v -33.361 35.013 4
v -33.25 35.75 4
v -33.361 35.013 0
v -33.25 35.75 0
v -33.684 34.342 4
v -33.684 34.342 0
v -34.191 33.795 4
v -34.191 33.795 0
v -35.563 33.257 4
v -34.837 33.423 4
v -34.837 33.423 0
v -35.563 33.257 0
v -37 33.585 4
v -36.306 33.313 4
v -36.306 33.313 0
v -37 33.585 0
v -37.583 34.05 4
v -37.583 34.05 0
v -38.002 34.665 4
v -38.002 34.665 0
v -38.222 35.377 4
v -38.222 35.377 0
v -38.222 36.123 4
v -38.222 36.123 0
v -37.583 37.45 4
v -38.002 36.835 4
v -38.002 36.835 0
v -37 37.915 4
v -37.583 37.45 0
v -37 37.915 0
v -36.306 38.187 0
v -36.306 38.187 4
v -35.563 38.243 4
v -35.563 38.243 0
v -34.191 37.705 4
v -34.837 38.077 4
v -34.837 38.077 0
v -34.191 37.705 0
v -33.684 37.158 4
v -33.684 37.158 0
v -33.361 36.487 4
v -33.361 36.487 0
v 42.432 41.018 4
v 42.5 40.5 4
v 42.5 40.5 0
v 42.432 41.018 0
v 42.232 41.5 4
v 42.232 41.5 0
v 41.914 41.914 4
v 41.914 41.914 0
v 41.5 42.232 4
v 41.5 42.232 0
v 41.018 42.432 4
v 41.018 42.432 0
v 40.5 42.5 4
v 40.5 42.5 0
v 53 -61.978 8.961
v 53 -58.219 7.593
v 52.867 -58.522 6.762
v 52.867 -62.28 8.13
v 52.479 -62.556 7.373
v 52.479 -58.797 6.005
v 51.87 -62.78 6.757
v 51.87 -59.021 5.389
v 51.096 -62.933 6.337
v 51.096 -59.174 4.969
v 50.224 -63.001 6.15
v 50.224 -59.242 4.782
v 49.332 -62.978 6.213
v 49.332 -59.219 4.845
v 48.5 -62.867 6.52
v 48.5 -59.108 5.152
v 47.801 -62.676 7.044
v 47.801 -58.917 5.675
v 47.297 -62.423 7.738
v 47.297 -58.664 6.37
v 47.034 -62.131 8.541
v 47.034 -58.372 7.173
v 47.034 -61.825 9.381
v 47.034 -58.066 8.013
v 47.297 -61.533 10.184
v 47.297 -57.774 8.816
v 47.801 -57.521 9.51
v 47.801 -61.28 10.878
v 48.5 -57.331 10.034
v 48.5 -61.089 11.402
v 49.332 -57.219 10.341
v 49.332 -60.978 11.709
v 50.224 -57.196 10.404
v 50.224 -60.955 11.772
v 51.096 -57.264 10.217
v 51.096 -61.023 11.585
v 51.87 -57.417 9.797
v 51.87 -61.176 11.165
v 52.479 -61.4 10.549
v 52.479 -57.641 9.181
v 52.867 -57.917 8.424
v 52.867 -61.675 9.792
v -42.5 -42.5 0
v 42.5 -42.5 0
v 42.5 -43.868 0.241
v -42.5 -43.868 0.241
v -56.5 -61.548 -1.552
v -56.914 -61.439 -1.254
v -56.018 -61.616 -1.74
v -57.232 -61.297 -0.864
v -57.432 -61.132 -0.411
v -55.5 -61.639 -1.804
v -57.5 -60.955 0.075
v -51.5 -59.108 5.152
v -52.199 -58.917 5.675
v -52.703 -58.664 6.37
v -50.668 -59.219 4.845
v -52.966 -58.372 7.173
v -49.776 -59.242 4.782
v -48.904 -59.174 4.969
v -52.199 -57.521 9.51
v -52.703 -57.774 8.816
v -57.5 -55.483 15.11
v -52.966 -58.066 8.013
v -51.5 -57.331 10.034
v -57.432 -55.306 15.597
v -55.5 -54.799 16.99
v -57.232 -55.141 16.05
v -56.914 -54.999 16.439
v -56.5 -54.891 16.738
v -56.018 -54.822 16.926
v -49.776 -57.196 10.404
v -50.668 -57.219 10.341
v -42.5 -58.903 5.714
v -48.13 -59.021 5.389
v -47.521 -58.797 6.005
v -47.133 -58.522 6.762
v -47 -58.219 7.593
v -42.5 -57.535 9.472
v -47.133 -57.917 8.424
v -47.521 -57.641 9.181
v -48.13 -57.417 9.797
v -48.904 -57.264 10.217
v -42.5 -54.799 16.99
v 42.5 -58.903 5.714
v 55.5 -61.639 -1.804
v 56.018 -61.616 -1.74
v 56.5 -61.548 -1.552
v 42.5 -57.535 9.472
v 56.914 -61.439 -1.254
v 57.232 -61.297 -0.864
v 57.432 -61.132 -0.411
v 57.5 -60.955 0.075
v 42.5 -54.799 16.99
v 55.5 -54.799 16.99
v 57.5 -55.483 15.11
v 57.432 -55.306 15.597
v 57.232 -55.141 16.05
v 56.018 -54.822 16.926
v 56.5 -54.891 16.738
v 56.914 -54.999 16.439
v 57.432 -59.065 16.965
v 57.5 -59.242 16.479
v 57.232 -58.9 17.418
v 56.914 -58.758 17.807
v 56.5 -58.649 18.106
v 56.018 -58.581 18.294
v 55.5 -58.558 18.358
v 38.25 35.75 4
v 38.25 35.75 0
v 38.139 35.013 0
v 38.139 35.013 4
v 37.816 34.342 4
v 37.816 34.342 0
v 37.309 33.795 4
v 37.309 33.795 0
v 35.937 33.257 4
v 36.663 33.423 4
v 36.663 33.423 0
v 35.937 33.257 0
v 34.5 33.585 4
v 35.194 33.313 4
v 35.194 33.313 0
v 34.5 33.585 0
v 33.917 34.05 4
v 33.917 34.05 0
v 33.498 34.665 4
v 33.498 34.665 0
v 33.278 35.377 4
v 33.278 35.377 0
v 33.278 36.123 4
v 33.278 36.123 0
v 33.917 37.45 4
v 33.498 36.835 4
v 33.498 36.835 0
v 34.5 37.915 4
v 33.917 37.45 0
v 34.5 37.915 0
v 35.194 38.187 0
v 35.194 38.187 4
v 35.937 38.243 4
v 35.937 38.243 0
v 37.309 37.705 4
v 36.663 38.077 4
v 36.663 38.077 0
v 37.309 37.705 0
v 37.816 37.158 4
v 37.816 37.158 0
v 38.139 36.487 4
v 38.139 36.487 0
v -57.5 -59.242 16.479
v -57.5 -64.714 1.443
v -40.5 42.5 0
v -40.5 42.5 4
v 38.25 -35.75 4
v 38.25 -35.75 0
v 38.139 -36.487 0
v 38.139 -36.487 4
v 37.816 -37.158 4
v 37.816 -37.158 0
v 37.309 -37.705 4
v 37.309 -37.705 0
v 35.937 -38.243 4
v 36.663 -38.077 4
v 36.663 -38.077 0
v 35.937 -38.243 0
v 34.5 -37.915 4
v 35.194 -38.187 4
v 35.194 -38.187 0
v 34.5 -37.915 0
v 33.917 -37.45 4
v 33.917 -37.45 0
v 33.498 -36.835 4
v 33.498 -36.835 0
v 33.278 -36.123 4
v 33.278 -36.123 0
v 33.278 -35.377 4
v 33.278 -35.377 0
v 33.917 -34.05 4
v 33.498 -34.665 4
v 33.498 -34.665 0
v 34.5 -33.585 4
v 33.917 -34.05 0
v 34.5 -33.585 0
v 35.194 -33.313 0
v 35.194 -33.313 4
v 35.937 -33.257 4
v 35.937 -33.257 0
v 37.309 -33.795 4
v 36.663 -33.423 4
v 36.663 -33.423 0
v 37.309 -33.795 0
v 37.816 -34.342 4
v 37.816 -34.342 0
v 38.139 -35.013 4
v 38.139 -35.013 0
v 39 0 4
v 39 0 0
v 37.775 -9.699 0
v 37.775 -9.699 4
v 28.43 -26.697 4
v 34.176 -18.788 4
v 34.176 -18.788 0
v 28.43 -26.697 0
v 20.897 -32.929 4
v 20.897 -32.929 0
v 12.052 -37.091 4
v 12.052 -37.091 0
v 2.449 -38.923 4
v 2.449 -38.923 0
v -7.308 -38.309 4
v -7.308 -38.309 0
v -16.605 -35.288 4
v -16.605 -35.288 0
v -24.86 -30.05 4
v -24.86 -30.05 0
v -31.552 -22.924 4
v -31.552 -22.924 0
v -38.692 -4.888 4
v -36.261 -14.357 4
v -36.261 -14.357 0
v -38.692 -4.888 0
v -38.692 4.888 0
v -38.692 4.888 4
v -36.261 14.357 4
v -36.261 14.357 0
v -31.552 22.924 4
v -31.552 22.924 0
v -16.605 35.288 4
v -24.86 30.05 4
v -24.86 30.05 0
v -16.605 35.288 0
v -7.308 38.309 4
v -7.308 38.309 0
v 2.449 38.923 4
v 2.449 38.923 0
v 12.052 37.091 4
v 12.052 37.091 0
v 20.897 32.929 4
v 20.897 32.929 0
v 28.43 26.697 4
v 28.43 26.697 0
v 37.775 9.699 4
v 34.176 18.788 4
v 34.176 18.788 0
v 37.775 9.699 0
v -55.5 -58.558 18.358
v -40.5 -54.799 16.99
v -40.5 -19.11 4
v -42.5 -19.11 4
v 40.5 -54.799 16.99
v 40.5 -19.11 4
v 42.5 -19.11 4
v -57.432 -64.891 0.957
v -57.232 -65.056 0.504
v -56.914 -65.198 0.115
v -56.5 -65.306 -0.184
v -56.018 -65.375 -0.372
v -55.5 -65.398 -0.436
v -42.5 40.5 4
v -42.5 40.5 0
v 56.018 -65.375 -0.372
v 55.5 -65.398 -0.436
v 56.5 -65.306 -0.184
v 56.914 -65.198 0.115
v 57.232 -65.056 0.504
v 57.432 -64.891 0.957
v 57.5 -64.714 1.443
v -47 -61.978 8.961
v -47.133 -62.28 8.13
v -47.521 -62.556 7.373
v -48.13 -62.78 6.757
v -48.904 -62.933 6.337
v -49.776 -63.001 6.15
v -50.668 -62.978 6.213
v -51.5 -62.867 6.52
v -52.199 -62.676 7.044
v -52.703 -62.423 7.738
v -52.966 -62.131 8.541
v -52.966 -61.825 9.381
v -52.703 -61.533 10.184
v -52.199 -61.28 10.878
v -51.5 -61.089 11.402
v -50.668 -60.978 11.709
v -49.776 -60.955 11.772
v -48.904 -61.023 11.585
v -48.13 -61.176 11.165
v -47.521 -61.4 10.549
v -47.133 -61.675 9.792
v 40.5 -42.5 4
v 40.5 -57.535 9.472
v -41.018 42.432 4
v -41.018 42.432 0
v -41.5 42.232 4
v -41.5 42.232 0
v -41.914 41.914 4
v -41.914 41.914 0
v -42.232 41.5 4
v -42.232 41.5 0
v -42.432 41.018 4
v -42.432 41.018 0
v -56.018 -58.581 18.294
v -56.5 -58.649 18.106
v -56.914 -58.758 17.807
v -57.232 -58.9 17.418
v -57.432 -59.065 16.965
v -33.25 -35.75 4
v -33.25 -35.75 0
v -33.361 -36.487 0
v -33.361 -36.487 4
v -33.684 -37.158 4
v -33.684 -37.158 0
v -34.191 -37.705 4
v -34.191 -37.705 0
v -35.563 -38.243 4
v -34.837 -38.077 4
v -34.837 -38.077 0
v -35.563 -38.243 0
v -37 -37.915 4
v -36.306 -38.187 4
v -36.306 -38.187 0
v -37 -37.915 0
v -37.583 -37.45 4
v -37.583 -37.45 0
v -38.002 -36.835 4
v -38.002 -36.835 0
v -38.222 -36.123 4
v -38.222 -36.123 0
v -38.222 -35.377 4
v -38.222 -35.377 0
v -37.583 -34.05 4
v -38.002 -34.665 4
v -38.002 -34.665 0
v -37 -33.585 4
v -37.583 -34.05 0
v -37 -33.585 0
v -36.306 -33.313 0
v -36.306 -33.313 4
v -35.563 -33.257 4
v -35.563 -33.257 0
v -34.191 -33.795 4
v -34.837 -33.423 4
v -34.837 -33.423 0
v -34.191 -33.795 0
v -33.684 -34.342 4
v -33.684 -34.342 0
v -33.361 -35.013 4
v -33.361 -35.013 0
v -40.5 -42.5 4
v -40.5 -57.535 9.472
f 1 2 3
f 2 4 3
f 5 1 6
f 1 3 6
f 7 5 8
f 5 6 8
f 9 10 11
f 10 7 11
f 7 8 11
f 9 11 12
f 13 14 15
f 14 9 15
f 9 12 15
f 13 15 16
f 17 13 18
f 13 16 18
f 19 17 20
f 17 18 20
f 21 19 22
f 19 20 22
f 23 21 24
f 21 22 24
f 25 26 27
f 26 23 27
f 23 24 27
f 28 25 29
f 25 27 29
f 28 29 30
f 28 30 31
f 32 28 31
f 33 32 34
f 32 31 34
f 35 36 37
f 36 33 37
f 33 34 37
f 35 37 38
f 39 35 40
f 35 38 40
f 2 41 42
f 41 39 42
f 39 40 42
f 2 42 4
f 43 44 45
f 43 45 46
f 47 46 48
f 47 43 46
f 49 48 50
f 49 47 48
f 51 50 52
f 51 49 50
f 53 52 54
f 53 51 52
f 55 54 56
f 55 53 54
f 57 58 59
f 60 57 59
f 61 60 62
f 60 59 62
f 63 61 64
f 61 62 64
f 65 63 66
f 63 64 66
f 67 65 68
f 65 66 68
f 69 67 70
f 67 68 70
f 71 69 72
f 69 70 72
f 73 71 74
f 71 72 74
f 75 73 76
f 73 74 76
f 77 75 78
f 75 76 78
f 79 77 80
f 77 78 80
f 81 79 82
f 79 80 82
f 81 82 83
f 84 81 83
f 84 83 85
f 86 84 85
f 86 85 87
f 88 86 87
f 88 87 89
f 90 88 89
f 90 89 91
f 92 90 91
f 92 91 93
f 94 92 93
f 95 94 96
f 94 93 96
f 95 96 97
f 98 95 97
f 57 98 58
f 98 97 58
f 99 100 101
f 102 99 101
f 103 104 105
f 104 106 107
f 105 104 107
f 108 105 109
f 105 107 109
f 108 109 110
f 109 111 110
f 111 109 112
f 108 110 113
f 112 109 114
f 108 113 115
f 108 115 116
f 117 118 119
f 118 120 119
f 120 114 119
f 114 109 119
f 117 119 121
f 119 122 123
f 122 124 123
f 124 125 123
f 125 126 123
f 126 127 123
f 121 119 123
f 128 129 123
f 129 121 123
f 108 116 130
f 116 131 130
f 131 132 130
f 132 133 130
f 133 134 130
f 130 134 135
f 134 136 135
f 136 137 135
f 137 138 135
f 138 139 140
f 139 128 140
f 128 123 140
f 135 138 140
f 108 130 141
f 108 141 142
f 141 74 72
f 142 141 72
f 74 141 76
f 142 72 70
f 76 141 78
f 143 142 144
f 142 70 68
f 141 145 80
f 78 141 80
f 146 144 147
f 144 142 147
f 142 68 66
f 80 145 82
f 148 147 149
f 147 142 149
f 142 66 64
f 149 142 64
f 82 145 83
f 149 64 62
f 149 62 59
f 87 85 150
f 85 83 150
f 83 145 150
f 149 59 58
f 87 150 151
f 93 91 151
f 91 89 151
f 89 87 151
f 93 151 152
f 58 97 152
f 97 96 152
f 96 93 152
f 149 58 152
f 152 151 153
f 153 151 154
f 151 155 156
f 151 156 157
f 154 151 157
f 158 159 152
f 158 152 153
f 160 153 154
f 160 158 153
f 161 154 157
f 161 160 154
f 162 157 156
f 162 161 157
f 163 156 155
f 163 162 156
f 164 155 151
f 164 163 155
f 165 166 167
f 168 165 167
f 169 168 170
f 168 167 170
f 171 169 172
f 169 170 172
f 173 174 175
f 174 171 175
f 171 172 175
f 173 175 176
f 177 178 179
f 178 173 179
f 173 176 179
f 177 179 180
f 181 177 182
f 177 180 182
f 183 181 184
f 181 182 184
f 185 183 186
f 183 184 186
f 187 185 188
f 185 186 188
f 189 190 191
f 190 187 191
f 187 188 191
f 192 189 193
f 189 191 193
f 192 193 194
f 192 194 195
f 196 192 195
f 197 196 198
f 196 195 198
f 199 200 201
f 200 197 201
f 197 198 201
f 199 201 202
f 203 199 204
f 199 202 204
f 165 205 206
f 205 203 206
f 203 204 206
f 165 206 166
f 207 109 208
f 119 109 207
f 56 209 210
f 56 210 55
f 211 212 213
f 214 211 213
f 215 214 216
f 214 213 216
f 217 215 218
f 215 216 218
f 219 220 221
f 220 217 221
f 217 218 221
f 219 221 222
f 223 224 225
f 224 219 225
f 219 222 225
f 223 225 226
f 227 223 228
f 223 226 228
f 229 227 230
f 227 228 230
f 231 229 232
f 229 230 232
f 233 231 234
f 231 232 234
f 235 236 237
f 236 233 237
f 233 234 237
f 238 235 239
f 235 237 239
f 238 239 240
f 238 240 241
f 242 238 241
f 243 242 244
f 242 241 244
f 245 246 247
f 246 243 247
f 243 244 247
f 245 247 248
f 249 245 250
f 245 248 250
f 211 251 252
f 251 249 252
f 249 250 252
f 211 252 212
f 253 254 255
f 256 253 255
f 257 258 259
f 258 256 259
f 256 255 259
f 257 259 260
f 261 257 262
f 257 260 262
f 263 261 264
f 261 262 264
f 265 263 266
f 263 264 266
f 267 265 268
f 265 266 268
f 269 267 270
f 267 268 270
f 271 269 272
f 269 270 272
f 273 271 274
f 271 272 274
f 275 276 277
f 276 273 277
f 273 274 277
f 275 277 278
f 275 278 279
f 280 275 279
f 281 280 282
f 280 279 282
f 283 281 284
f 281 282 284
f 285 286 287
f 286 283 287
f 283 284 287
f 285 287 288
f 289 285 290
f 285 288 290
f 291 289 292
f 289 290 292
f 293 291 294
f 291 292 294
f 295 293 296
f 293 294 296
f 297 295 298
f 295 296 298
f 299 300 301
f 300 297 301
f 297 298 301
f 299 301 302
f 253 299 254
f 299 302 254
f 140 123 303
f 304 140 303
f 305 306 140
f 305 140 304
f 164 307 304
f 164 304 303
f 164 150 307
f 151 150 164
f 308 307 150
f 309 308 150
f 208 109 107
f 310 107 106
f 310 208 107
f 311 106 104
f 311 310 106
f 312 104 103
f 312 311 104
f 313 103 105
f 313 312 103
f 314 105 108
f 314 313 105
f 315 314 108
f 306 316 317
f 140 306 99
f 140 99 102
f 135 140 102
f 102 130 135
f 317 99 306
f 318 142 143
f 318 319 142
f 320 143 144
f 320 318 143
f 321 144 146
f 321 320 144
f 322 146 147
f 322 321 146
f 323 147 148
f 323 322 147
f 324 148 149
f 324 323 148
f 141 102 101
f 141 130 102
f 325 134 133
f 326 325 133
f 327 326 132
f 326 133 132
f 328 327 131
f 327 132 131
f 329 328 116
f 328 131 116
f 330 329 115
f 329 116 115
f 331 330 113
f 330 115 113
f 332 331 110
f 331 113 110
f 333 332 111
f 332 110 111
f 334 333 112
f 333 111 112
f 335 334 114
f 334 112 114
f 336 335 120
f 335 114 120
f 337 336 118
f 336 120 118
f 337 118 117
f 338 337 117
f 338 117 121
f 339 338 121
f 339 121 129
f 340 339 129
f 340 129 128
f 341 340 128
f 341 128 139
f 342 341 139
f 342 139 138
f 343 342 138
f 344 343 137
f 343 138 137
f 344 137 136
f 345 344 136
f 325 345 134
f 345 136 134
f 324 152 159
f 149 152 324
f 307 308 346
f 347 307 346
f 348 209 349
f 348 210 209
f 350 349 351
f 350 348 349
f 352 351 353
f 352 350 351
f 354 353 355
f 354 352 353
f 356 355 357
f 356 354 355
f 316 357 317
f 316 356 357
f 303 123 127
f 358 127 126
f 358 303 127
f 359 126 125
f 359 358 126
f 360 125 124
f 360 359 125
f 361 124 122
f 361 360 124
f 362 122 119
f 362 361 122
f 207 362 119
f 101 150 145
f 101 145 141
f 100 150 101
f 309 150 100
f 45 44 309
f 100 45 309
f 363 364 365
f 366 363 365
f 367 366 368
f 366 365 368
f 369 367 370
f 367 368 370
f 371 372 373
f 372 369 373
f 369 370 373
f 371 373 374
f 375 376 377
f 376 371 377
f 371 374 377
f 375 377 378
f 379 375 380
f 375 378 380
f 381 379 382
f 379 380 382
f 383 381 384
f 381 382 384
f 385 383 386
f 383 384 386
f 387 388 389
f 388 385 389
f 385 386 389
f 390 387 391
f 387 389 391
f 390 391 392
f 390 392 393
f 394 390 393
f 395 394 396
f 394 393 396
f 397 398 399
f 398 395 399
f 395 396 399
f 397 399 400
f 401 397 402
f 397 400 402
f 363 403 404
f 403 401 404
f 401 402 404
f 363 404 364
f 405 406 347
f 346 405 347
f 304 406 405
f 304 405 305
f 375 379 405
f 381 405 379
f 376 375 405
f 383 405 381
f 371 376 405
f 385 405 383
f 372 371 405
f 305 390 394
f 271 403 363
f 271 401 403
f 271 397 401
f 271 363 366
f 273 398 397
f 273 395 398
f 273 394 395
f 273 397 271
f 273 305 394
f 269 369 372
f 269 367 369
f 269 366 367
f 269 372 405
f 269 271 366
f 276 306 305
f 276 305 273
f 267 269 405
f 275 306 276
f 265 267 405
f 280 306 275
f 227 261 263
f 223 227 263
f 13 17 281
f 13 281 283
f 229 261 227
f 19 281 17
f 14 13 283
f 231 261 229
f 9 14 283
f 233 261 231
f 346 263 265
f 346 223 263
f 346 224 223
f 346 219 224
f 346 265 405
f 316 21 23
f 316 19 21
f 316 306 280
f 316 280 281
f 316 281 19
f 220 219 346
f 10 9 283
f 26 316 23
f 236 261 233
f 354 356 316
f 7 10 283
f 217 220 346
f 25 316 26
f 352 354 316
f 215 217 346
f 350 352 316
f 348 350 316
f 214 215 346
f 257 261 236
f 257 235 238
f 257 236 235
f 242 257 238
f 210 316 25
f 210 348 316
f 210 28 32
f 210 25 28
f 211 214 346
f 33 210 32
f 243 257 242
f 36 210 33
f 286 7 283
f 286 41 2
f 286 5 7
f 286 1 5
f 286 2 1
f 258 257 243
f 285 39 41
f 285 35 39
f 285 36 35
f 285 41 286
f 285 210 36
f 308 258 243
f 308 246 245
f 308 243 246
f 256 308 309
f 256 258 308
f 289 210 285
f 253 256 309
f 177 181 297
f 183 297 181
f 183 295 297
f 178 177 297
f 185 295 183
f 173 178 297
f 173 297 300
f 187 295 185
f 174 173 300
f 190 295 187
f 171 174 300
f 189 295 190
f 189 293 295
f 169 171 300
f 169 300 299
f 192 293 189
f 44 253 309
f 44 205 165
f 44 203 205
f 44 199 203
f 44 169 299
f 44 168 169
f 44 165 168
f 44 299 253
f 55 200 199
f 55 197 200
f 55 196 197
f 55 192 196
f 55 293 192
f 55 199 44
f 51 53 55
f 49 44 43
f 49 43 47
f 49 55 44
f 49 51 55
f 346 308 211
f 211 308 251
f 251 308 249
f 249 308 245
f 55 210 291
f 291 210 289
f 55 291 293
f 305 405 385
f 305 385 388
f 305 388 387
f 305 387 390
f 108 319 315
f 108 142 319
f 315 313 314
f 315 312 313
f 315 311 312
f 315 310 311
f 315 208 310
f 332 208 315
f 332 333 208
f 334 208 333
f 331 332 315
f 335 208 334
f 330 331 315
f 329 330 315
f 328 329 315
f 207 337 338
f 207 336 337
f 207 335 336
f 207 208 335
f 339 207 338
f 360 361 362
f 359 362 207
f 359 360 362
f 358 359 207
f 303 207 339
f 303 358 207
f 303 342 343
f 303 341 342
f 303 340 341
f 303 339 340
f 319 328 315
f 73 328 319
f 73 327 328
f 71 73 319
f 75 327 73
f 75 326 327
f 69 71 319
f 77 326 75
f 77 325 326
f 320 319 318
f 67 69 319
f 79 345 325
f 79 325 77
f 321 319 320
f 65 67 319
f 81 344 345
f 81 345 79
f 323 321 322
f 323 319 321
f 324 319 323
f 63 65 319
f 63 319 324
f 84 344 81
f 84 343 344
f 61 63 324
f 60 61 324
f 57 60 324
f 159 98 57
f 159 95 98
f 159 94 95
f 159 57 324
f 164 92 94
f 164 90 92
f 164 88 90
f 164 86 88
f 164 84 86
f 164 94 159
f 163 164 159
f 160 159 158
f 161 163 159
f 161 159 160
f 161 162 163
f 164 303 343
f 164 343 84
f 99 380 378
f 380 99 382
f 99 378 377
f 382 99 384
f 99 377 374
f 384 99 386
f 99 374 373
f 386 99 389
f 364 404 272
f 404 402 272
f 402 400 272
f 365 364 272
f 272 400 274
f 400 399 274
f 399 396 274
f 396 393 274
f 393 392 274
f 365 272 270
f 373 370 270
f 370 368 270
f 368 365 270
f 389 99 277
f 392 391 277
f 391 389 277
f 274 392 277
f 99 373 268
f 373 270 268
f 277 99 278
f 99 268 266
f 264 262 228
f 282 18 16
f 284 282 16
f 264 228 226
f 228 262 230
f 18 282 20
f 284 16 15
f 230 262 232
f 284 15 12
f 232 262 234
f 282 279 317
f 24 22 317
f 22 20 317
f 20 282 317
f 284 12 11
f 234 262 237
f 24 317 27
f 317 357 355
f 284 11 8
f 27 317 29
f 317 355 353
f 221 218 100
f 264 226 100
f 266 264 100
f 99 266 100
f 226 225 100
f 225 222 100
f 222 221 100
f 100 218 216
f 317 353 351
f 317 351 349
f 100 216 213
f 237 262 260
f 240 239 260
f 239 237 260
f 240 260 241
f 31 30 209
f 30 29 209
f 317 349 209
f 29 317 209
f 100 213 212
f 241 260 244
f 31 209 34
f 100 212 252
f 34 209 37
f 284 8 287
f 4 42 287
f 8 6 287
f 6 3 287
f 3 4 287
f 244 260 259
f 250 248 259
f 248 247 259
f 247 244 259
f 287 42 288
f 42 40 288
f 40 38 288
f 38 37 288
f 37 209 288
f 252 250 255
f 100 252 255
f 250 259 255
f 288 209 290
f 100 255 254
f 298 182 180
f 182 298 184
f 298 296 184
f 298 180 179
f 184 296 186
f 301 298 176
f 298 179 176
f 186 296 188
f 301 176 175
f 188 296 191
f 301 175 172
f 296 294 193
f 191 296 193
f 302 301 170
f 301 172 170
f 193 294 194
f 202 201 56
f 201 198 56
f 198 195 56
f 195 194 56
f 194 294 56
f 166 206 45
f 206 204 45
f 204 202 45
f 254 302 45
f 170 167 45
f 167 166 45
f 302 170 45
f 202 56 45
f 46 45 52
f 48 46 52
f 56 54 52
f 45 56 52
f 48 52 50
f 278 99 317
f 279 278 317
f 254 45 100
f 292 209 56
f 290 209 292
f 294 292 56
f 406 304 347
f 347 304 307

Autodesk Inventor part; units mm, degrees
ref_plane "YZ Plane" through (0, 0, 0) normal (1, 0, 0) x (0, 1, 0)
ref_plane "XZ Plane" through (0, 0, 0) normal (0, 1, 0) x (-1, 0, 0)
ref_plane "XY Plane" through (0, 0, 0) normal (0, 0, 1) x (1, 0, 0)
sketch "Sketch1" plane through (0, 0, 0) normal (0, 0, 1) x (1, 0, 0)
  line L0 (-35.75, 35.75) -> (35.75, -35.75) construction
  line L1 (35.75, 35.75) -> (-35.75, -35.75) construction
  line L2 (-42.5, 42.5) -> (42.5, 42.5)
  line L3 (42.5, 42.5) -> (42.5, -42.5)
  line L4 (42.5, -42.5) -> (-42.5, -42.5)
  line L5 (-42.5, -42.5) -> (-42.5, 42.5)
  line L6 (-42.5, 42.5) -> (42.5, -42.5) construction
  line L7 (42.5, 42.5) -> (-42.5, -42.5) construction
  circle A0 centre (-35.75, 35.75) radius 2.5
  circle A1 centre (35.75, 35.75) radius 2.5
  circle A2 centre (-35.75, -35.75) radius 2.5
  circle A3 centre (35.75, -35.75) radius 2.5
  circle A4 centre (0, 0) radius 39
  dimension "d0" = 71.5
  dimension "d1" = 71.5
  dimension "d2" = 85
  dimension "d3" = 85
  dimension "d4" = 5
  dimension "d5" = 5
  dimension "d6" = 5
  dimension "d7" = 5
  dimension "d8" = 78
extrude "Extrusion1" add sketch "Sketch1" along normal blind 4
ref_plane "Work Plane2" through (42.5, -42.5, 4) normal (0, -0.342, -0.9397) x (1, 0, 0)
sketch "Sketch4" plane through (42.5, -42.5, 4) normal (0, -0.342, -0.9397) x (1, 0, 0)
  line L0 (-85, 0) -> (0, 0) projected
  line L1 (0, 0) -> (-85, 0)
  line L2 (-85, 0) -> (-85, 16)
  line L3 (-85, 16) -> (0, 16)
  line L4 (0, 16) -> (0, 0)
  point P0 (-42.5, -41.305)
  dimension "d15" = 16
extrude "Extrusion2" add sketch "Sketch4" along normal blind 4
sketch "Sketch5" plane through (42.5, -57.5351, 9.4723) normal (1, 0, 0) x (0, -0.342, -0.9397)
  line L0 (0, 0) -> (0, 16) projected
  line L1 (3.7588, 17.3681) -> (0, 16) projected
  line L2 (0, 16) -> (3.7588, 17.3681)
  line L3 (4, 16) -> (4, 0) projected
  line L4 (3.7588, 17.3681) -> (4, 16)
  line L5 (4, 16) -> (0, 16)
  point P0 (-10.7771, 57.305)
extrude "Extrusion3" add sketch "Sketch5" against normal blind 85
sketch "Sketch6" plane through (-42.5, -57.5351, 9.4723) normal (0, -0.9397, 0.342) x (1, 0, 0)
  line L0 (85, 0) -> (85, -4) projected
  line L1 (85, -4) -> (0, 0)
  line L2 (100, -12) -> (-15, -12)
  line L3 (-15, -12) -> (-15, 8)
  line L4 (-15, 8) -> (100, 8)
  line L5 (100, 8) -> (100, -12)
  line L6 (100, -12) -> (-15, 8) construction
  line L7 (-15, -12) -> (100, 8) construction
  circle A0 centre (92.5, -2) radius 3
  line L8 (42.5, 8) -> (42.5, -12)
  circle A1 centre (-7.5, -2) radius 3
  point P0 (42.5, -2)
  dimension "d20" = 115
  dimension "d21" = 20
  dimension "d22" = 6
  dimension "d23" = 7.5
extrude "Extrusion4" add sketch "Sketch6" along normal blind 4
fillet "Fillet1" radius 2 6 edges at (57.5, -63.5187, -1.1199) (-57.5, -63.5187, -1.1199) (-57.5, -56.6783, 17.6739) (57.5, -56.6783, 17.6739) (42.5, 42.5, 2) (-42.5, 42.5, 2)
sketch "Sketch8" plane through (-42.5, -57.5351, 9.4723) normal (0, 0.9397, -0.342) x (1, 0, 0)
  line L0 (0, 0) -> (2, 0)
  line L1 (2, 0) -> (2, -8)
  line L2 (2, -8) -> (0, -8)
  line L3 (0, -8) -> (0, 0)
  point P0 (42.5, -10.7771)
  dimension "d33" = 2
  dimension "d34" = 8
extrude "Extrusion6" add sketch "Sketch8" along normal up to surface surface through (0, 0, 4) normal (0, 0, 1)
ref_plane "Work Plane3" through (0, -42.5, 0) normal (-1, 0, 0) x (0, 0, 1)
mirror "Mirror1" about plane through (0, -42.5, 0) normal (-1, 0, 0) of "Extrusion6"
properties part number "Eletronica - FanPlaca"
